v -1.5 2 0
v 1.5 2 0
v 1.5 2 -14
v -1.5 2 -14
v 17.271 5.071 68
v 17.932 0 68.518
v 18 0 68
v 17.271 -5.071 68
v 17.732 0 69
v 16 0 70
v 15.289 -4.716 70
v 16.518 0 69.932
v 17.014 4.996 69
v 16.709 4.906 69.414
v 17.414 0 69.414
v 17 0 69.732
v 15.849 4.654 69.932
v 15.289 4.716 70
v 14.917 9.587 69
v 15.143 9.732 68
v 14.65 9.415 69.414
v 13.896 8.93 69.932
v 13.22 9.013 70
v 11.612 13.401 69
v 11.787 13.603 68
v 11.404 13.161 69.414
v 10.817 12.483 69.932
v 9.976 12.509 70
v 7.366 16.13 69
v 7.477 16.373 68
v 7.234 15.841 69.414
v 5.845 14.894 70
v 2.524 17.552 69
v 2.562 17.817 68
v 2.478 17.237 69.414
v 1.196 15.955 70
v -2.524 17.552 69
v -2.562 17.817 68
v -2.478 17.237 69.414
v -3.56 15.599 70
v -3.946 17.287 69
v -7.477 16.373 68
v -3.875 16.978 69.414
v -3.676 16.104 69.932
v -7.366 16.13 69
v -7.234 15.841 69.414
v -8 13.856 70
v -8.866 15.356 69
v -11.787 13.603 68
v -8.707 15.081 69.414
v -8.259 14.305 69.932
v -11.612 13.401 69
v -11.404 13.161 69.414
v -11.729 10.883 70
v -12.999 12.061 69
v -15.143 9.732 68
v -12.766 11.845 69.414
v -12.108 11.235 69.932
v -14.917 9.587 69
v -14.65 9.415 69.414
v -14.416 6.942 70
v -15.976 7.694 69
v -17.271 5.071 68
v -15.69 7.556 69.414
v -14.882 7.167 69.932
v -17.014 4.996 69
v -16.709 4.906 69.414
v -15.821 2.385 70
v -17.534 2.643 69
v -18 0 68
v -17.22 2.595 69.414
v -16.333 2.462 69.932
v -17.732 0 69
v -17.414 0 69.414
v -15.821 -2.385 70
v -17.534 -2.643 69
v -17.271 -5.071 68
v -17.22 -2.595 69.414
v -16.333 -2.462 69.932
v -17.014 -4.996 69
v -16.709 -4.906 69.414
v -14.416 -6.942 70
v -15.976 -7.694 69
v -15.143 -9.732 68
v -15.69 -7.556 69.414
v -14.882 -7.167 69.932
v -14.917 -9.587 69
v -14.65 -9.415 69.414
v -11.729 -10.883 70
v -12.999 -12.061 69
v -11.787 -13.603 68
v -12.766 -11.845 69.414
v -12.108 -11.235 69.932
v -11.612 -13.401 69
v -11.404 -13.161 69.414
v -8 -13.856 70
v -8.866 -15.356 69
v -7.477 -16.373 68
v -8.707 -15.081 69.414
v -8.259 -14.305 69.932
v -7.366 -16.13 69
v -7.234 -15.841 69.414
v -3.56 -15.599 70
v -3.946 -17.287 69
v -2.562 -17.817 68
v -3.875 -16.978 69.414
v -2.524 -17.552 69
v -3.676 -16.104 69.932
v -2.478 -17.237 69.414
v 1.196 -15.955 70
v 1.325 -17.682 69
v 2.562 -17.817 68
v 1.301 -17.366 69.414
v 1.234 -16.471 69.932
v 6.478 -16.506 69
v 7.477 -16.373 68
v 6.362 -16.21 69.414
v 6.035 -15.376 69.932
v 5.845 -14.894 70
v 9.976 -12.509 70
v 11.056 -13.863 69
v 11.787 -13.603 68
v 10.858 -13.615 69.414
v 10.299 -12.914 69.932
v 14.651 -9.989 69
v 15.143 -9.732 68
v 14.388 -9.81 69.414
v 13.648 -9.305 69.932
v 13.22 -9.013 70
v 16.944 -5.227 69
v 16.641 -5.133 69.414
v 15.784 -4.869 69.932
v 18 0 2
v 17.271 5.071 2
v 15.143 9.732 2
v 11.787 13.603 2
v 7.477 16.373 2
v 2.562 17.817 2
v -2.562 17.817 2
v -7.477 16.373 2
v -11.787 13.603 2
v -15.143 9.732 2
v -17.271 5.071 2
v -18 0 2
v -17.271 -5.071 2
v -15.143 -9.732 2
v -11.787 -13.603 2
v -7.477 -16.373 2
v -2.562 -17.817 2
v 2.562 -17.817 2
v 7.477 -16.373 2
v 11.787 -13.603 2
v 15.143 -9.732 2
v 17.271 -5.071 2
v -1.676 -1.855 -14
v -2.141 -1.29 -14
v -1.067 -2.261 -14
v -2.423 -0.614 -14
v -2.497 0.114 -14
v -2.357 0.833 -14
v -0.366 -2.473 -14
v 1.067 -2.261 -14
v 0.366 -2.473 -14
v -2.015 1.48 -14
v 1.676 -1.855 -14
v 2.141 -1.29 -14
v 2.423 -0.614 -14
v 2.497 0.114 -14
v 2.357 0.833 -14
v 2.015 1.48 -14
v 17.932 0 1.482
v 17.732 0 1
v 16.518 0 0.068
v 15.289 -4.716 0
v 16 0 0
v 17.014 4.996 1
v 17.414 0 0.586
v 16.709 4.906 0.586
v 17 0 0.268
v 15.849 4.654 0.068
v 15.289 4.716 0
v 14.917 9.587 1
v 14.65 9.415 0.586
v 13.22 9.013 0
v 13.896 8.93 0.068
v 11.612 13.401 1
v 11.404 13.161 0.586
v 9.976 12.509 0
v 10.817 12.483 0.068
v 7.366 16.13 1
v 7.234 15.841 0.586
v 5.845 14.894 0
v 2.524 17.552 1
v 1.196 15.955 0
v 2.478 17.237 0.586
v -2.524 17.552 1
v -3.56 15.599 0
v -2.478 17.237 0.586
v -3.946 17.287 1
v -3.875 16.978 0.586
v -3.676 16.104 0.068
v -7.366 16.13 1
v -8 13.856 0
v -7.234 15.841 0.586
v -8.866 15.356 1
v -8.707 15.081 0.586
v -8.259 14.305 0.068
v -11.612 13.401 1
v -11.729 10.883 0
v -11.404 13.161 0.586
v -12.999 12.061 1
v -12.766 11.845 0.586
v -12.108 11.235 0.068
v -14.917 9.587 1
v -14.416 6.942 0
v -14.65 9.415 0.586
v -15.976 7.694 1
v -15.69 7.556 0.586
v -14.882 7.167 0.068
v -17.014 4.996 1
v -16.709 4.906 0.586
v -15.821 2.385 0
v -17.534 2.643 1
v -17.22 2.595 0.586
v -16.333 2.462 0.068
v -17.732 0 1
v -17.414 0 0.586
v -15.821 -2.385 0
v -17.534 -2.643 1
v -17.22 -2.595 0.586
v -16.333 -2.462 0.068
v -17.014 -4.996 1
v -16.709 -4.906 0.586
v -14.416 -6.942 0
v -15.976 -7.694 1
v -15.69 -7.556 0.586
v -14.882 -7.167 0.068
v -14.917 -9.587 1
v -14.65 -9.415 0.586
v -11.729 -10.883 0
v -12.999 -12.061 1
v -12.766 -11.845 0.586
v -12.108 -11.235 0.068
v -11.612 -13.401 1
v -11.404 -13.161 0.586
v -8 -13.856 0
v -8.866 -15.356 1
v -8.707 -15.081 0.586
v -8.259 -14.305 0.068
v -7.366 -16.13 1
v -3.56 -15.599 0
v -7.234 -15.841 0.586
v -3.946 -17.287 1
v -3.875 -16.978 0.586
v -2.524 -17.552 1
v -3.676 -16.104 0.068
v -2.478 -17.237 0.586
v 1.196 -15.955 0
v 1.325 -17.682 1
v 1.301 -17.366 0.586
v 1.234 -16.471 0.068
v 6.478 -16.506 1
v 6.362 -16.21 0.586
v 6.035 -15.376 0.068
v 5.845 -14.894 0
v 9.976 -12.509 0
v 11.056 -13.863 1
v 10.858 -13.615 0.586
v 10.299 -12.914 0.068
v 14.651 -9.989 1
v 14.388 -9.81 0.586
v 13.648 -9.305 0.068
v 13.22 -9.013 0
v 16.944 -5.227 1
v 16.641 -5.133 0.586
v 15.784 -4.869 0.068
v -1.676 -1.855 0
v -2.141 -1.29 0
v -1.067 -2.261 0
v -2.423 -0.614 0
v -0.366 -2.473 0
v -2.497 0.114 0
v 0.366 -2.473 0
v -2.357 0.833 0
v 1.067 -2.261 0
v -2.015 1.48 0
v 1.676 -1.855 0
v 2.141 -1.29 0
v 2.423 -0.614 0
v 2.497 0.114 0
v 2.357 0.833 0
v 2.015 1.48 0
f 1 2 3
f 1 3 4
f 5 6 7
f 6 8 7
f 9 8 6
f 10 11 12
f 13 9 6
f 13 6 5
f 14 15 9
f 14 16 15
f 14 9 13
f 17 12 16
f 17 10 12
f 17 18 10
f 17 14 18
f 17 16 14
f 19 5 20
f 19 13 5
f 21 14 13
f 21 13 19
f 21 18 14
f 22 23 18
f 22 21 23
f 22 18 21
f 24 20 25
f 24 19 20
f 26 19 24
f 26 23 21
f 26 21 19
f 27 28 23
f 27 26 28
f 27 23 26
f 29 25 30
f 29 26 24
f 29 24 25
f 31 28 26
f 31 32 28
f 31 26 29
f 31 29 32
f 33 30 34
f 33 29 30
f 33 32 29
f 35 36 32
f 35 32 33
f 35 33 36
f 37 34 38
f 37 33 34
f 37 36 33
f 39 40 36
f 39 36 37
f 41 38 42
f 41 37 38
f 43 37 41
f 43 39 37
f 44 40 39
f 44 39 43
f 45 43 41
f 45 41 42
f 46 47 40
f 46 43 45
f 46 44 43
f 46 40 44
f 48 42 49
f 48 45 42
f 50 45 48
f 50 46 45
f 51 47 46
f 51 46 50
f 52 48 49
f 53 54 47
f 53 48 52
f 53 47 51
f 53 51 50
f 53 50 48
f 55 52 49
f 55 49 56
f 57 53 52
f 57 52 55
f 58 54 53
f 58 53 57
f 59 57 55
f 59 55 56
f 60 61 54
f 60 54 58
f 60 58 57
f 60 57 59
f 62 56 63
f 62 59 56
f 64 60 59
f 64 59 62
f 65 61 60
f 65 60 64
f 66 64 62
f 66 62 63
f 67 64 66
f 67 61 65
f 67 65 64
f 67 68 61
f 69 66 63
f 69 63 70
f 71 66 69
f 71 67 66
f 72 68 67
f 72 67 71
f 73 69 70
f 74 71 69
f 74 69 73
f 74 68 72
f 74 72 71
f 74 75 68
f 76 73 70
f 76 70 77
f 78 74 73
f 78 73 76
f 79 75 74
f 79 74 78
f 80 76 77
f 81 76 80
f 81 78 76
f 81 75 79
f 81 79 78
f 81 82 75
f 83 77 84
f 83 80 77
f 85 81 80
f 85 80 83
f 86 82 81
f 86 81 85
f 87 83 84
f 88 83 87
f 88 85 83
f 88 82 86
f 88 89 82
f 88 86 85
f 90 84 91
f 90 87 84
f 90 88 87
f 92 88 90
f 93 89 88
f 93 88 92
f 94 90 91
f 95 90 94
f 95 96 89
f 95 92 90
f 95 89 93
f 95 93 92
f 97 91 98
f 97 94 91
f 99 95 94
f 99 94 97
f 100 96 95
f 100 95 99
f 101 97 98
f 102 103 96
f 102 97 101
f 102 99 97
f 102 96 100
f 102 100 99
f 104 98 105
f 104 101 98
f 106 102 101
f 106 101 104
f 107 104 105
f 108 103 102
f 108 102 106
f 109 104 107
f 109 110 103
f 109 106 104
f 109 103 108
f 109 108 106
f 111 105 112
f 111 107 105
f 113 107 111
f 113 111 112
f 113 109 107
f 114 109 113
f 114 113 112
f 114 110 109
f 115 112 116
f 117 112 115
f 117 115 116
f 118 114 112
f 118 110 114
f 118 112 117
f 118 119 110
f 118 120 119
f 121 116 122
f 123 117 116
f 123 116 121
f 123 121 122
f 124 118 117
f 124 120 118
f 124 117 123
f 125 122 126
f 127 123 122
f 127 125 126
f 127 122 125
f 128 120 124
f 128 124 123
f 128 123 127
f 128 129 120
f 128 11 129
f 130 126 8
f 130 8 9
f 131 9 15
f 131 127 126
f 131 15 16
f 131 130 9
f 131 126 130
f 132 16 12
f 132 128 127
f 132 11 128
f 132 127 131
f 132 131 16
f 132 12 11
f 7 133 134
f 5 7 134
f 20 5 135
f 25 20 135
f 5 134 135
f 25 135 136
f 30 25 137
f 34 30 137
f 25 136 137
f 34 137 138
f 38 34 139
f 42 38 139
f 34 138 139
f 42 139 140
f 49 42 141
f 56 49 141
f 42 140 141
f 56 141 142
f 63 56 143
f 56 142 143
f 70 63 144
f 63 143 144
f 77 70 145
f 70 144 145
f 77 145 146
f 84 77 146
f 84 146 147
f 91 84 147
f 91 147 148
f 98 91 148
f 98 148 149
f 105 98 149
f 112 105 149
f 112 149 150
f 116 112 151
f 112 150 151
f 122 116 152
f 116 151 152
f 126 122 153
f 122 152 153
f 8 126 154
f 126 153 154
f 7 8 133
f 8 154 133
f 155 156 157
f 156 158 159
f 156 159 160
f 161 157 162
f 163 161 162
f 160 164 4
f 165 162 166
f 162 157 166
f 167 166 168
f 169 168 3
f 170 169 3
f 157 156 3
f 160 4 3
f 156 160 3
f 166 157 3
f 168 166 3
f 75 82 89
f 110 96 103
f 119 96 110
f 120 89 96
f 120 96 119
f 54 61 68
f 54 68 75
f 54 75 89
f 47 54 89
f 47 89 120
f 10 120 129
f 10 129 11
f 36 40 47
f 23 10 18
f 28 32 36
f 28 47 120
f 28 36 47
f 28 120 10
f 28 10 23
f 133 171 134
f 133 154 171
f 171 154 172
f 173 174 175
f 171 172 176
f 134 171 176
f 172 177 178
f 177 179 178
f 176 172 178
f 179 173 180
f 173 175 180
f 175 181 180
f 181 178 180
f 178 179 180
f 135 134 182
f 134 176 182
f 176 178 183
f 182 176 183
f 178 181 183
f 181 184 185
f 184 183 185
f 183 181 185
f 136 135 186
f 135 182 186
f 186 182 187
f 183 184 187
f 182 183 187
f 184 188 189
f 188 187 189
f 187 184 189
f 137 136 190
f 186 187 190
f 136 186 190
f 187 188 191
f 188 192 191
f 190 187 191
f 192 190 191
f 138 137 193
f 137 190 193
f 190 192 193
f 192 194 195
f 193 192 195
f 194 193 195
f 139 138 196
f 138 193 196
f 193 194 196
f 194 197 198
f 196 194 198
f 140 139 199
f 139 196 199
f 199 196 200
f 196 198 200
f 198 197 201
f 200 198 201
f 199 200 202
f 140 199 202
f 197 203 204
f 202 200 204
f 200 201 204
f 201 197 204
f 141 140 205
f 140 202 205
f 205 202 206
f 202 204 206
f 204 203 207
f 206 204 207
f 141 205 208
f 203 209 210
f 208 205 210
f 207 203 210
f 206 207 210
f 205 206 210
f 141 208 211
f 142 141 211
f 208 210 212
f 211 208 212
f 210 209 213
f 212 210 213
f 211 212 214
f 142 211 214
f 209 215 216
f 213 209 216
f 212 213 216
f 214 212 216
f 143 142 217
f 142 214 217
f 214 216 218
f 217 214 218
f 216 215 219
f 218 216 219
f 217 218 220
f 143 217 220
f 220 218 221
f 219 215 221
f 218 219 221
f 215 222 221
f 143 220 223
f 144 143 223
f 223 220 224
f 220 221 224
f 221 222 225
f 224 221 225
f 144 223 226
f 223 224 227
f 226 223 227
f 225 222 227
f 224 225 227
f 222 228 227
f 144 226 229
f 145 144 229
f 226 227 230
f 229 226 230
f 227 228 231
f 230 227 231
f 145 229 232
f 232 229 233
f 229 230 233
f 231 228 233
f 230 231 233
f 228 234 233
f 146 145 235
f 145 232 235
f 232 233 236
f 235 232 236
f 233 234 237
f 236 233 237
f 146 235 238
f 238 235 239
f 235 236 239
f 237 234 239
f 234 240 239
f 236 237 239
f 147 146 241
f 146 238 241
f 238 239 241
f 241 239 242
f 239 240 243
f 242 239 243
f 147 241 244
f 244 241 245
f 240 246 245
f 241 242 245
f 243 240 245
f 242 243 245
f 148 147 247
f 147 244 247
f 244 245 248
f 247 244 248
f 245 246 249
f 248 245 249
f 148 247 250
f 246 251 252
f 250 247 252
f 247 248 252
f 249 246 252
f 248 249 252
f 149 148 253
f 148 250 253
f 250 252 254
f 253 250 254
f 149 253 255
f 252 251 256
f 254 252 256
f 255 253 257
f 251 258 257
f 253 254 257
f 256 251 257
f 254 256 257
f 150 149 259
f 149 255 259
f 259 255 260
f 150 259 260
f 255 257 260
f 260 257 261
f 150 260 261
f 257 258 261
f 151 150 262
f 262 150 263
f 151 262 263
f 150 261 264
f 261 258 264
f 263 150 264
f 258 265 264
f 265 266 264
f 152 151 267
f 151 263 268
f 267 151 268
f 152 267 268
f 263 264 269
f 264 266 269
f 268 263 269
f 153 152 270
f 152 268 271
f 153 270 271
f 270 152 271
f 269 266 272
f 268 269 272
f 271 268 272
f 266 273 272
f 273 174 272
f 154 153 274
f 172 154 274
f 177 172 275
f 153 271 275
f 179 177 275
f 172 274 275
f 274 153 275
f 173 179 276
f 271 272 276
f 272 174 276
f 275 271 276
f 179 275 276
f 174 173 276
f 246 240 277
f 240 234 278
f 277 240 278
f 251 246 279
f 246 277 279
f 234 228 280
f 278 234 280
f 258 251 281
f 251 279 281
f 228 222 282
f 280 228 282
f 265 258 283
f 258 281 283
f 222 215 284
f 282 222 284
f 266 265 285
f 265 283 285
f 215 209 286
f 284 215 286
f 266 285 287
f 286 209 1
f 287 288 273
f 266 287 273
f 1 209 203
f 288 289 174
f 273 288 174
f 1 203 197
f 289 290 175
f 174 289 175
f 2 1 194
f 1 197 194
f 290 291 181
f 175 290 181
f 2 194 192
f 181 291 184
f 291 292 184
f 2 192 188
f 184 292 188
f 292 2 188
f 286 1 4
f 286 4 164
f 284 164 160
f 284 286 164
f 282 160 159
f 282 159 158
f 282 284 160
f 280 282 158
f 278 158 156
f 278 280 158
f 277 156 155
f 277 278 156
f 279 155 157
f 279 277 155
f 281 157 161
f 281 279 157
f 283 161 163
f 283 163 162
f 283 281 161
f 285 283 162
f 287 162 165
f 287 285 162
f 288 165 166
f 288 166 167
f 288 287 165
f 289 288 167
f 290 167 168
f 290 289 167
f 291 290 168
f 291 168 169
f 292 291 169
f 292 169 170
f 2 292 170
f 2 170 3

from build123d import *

# Parameters (mm, degrees)
SKETCH1_R           = 18
BOSS_EXTRUDE1_DEPTH = 70
BOSS_EXTRUDE2_DEPTH = 14
FILLET1_R           = 2


with BuildPart() as part:
    # Sketch1 → Boss-Extrude1 (new body)
    with BuildSketch(Plane.XY):
        Circle(SKETCH1_R)
    extrude(amount=BOSS_EXTRUDE1_DEPTH)

    # Sketch2 → Boss-Extrude2 (add)
    with BuildSketch(Plane(origin=(0, 0, 0), x_dir=(-1, 0, 0), z_dir=(0, 0, -1))):
        with BuildLine():
            Line((-1.5, 2), (1.5, 2))
            ThreePointArc((1.5, 2), (0, -2.5), (-1.5, 2))
        make_face()
    extrude(amount=BOSS_EXTRUDE2_DEPTH)

    # Fillet1
    fillet1_edges = [part.edges().sort_by_distance(p)[0] for p in [
        (-18, 0, 0),
        (-18, 0, 70),
    ]]
    fillet(fillet1_edges, radius=FILLET1_R)


solid = part.part
